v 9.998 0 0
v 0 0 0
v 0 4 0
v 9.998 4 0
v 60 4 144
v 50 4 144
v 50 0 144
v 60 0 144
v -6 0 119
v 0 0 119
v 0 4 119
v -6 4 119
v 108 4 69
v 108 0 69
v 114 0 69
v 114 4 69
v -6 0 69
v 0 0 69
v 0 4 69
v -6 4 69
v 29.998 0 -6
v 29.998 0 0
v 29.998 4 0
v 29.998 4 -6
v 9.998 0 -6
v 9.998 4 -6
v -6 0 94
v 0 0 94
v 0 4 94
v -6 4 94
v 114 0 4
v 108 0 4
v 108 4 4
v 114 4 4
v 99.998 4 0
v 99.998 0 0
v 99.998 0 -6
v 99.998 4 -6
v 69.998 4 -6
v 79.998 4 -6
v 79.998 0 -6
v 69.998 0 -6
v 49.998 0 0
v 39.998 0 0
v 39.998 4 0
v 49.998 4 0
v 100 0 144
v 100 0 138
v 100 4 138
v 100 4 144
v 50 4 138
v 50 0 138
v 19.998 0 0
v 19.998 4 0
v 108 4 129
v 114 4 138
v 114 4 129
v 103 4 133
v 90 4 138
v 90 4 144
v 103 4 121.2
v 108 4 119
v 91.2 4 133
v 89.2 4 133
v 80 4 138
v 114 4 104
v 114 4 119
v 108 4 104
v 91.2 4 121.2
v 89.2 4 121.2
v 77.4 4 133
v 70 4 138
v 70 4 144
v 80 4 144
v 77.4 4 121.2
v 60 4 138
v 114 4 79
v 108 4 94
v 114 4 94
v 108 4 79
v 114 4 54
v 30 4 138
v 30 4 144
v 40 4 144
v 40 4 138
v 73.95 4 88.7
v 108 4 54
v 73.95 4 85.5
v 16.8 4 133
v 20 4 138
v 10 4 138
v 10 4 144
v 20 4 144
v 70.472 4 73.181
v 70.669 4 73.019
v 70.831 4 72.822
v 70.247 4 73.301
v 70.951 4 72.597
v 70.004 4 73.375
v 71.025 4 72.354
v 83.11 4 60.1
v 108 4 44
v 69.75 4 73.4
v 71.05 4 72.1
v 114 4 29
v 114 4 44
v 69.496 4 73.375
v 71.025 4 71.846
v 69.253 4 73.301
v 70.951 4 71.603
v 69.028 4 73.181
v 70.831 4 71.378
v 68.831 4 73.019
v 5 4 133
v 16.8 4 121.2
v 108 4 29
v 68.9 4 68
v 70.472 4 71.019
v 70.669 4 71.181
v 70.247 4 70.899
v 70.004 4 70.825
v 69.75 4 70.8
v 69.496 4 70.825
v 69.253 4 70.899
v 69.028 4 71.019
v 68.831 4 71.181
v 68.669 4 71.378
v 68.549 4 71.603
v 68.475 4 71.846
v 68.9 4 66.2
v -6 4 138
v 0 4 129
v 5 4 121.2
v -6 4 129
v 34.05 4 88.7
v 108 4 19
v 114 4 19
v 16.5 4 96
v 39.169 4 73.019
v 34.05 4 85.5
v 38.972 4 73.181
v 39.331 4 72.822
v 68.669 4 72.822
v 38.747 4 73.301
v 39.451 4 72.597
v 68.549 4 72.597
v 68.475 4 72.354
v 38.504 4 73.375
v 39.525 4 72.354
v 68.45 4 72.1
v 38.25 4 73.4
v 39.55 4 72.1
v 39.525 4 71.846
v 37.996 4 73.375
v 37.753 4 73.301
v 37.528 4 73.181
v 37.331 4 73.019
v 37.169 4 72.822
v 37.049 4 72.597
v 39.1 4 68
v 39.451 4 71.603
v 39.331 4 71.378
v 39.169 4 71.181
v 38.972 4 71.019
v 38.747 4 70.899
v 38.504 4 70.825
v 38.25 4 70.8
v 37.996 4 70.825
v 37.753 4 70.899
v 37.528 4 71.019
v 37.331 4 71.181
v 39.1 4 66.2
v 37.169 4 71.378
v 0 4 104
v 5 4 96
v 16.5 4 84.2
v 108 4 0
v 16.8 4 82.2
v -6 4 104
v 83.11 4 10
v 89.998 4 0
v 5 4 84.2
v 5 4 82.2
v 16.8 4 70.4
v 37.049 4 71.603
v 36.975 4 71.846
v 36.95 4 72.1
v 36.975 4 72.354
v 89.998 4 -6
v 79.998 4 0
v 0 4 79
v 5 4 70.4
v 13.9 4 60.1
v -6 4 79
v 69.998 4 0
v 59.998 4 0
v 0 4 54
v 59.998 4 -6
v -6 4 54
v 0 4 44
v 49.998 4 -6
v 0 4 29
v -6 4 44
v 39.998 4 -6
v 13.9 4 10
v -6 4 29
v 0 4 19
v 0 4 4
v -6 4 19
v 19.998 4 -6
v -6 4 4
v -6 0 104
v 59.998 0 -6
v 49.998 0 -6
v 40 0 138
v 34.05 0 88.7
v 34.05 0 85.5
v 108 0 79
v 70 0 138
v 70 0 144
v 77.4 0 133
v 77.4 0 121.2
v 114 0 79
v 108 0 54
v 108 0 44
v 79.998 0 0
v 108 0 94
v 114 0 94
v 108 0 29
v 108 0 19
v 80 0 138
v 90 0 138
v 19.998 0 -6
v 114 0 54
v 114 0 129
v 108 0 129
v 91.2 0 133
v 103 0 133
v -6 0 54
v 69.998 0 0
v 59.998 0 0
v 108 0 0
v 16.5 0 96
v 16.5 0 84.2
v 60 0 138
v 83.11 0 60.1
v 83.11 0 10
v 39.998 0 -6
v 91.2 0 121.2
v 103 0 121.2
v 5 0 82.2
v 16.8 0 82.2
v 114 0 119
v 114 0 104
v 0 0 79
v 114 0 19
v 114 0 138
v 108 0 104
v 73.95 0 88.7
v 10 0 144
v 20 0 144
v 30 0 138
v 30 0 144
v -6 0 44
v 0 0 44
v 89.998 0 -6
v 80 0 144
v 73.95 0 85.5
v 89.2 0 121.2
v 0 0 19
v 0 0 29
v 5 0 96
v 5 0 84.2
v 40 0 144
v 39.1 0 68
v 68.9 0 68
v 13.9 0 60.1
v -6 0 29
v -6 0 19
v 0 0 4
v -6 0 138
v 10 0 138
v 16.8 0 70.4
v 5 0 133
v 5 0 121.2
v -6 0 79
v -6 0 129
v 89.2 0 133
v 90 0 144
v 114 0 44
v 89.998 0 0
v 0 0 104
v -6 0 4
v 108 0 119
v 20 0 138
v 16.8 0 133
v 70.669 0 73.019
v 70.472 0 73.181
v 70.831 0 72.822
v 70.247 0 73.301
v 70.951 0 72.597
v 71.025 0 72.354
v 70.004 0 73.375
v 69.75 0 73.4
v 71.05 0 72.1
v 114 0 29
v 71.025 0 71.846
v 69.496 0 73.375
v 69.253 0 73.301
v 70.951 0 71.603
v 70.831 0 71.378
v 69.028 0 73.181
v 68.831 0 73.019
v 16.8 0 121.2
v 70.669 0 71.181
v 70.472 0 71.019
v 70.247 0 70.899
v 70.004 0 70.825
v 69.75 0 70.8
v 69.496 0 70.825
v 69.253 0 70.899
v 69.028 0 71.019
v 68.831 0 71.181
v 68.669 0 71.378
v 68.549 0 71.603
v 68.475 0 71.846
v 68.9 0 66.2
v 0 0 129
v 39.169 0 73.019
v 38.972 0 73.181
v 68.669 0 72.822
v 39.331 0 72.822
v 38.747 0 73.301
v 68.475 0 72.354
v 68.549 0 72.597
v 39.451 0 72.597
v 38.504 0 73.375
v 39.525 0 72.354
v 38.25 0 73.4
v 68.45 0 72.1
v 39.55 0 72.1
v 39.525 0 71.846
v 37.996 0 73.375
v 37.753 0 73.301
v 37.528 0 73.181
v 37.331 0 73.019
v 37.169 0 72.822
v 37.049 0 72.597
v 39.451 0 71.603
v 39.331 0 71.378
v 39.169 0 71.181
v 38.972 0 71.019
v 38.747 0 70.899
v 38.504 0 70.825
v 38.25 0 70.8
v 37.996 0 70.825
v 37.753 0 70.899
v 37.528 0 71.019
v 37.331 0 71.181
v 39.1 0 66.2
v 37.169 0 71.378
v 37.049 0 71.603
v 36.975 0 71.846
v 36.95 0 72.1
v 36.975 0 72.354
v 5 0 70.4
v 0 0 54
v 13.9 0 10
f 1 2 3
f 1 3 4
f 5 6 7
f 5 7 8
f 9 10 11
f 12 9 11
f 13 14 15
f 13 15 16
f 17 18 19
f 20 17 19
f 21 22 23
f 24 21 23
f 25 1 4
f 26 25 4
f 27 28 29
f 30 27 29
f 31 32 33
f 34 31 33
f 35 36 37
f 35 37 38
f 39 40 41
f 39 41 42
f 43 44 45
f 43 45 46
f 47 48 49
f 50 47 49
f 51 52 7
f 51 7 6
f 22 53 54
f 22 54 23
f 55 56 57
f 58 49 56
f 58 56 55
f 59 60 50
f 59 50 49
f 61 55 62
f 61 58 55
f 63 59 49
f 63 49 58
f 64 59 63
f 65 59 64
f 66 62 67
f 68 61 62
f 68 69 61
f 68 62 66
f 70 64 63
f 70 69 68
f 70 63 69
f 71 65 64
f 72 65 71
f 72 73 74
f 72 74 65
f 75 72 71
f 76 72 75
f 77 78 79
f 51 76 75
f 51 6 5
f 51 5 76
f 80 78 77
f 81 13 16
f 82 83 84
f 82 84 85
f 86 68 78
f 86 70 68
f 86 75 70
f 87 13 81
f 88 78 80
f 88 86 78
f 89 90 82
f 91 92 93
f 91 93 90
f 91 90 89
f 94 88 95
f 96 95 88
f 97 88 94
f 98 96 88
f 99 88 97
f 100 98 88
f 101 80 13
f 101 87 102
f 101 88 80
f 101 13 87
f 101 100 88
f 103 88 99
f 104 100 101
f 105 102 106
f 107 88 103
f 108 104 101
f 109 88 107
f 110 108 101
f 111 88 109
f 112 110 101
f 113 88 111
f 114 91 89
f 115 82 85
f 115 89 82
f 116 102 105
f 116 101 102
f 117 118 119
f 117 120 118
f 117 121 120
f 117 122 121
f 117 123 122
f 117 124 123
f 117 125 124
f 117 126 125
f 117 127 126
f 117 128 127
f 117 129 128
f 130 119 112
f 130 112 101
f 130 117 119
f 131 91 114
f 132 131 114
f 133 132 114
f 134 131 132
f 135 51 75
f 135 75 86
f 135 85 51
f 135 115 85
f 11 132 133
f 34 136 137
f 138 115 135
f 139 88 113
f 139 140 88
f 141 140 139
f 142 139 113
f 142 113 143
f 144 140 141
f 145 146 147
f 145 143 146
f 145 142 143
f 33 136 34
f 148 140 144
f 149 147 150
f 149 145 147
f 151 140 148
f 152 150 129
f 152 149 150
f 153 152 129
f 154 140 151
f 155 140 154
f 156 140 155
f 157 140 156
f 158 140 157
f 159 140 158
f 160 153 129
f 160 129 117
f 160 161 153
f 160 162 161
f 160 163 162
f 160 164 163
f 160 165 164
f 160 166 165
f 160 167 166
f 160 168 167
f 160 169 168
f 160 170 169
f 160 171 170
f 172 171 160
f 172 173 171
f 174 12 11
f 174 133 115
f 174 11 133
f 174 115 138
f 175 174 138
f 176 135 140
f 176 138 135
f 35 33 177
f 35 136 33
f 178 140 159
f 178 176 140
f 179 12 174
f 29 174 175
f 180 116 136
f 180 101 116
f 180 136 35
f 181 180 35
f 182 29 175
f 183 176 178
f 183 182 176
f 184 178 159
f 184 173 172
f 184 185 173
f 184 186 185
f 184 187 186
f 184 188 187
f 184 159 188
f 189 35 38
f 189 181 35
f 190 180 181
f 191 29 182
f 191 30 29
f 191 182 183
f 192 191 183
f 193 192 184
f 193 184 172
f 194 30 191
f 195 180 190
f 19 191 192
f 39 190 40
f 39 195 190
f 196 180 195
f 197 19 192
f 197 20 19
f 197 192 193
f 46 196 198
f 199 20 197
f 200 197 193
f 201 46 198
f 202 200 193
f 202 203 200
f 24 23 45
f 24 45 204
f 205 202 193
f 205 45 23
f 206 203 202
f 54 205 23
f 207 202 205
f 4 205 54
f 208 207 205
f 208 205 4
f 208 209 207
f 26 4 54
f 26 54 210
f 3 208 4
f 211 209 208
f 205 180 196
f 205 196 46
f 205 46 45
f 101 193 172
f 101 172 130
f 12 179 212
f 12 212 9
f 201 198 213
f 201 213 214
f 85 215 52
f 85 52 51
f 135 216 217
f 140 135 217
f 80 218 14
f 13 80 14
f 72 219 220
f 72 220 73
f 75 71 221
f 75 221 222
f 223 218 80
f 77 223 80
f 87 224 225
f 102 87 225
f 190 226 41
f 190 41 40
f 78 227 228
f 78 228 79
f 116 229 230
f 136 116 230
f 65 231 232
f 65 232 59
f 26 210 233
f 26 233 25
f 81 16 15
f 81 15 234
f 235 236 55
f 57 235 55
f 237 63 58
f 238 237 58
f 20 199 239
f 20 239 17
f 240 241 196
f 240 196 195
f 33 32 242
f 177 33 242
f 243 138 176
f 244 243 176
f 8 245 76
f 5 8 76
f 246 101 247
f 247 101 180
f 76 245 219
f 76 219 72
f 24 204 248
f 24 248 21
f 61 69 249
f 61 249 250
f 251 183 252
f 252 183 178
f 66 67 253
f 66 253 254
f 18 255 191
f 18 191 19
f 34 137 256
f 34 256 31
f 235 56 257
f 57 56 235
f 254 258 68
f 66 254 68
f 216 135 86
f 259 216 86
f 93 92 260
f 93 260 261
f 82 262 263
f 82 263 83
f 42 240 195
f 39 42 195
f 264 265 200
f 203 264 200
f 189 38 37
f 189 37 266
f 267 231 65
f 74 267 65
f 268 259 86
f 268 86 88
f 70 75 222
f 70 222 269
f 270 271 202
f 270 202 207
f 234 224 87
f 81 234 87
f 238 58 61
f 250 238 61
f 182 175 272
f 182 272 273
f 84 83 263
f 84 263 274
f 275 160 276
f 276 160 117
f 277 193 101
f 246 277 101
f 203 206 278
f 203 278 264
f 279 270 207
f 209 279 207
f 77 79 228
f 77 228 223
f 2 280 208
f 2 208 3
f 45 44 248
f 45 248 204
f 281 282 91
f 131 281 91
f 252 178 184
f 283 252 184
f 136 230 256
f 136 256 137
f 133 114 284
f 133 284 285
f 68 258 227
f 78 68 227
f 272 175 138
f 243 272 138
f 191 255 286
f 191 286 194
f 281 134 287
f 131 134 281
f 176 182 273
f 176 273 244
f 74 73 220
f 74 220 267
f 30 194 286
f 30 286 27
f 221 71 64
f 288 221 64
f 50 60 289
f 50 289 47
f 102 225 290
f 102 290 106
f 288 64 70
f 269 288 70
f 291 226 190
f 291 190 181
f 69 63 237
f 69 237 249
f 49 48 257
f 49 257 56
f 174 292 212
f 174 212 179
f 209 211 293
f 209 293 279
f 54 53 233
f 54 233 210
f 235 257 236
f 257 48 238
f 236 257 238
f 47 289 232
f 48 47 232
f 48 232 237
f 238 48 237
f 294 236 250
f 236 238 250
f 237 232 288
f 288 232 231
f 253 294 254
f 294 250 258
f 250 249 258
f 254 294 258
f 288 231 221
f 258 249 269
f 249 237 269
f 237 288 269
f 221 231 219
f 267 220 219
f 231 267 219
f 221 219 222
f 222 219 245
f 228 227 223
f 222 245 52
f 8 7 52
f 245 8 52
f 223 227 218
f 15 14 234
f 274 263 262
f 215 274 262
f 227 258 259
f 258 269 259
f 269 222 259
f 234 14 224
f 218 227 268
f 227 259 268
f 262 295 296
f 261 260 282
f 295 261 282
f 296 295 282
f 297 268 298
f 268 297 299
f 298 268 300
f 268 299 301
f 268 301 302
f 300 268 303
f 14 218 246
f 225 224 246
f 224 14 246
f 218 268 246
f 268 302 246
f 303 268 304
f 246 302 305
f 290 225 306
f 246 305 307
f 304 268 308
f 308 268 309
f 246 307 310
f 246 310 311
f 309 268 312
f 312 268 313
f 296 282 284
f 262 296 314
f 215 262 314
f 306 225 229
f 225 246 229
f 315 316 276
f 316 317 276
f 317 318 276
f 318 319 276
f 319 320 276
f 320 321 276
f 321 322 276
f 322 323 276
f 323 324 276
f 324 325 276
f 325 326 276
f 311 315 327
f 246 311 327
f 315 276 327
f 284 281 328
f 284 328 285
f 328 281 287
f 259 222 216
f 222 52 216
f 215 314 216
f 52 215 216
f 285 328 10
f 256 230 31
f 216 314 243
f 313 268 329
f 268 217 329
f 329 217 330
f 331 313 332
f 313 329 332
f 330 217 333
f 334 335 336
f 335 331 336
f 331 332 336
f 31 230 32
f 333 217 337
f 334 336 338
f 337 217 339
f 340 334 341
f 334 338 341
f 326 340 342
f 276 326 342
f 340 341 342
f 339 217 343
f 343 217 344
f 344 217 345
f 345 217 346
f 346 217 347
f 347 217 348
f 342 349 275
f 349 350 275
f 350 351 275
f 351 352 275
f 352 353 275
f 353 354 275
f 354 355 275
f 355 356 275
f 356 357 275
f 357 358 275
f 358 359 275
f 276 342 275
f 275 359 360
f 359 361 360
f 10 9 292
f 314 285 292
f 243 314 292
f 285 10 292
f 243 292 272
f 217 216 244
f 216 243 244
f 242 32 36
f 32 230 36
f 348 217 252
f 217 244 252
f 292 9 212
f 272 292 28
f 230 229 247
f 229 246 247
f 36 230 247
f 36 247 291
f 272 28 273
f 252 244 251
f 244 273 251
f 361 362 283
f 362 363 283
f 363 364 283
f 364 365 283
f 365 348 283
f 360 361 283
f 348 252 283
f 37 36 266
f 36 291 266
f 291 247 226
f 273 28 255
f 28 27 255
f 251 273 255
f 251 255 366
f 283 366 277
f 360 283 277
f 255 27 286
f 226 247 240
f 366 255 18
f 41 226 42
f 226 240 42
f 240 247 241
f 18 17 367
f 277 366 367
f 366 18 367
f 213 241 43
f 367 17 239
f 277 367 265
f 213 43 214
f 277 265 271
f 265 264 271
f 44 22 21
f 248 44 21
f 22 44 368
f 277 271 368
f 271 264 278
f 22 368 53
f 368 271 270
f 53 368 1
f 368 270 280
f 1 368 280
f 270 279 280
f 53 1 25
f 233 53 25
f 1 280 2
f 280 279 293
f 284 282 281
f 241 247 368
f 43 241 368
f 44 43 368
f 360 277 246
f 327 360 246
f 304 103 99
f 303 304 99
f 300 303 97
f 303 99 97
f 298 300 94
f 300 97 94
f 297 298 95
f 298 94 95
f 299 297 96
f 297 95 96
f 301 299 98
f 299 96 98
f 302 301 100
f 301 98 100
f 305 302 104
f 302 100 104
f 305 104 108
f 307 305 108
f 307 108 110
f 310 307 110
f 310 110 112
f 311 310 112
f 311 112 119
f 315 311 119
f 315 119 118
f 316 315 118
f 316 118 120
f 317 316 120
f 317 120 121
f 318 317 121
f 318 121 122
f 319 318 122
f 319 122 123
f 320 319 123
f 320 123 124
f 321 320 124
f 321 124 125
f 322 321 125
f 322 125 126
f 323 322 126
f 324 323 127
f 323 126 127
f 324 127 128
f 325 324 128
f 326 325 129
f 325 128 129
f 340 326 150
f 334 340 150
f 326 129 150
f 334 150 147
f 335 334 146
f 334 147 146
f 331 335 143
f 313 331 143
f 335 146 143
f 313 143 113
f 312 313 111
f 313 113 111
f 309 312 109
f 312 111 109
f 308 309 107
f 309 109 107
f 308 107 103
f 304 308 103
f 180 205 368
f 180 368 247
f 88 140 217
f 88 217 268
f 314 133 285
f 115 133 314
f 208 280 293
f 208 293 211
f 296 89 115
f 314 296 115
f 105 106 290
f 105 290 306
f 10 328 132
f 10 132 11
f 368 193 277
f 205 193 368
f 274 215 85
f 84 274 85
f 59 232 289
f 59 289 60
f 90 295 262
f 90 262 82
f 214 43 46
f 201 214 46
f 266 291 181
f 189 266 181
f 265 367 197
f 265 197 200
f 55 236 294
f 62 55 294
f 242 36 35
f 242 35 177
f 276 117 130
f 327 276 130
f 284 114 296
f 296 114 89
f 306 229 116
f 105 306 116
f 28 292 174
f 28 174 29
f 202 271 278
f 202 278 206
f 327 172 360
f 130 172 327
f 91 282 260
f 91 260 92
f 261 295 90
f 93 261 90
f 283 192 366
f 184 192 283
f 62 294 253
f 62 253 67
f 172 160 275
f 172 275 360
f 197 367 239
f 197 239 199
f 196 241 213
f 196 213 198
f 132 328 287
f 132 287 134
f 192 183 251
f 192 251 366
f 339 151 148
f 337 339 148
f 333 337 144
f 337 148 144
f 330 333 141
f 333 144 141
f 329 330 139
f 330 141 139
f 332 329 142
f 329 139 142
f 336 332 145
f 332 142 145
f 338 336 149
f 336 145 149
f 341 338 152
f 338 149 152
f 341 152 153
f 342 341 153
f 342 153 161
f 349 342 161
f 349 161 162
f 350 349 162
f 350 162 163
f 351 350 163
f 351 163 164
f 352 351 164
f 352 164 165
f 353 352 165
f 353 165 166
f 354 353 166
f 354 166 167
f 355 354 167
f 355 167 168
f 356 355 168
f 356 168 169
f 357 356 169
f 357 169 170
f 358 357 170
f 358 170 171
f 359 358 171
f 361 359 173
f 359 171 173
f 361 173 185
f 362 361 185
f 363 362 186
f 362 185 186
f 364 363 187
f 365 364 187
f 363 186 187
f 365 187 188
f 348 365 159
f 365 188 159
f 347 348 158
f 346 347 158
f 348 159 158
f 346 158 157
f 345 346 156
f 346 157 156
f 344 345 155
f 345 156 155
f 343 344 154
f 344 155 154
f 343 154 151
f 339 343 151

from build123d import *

# Parameters (mm, degrees)
SKETCH_1_W          = 108
SKETCH_1_H          = 138
EXTRUDE_1_DEPTH     = 4
SKETCH_2_W          = 69.21
SKETCH_2_H          = 50.1
CUT_EXTRUDE_1_DEPTH = 176.282628917
SKETCH_4_W          = 15
SKETCH_4_H          = 4
EXTRUDE_2_DEPTH     = 6
SKETCH_6_W          = 9
SKETCH_6_H          = 4
EXTRUDE_3_DEPTH     = 6
SKETCH_7_W          = 15
SKETCH_7_H          = 4
EXTRUDE_4_DEPTH     = 6
SKETCH_8_W          = 9
SKETCH_8_H          = 4
EXTRUDE_5_DEPTH     = 6
SKETCH_9_W          = 10
SKETCH_9_H          = 4
EXTRUDE_6_DEPTH     = 6
SKETCH_10_W         = 10
SKETCH_10_H         = 4
EXTRUDE_7_DEPTH     = 6
SKETCH_11_W         = 11.5
SKETCH_11_H         = 11.8
SKETCH_11_W_2       = 11.8
CUT_EXTRUDE_2_DEPTH = 184.706287318
SKETCH_12_W         = 11.8
SKETCH_12_H         = 11.8
CUT_EXTRUDE_3_DEPTH = 184.706287318
SKETCH_13_W         = 11.8
SKETCH_13_H         = 11.8
CUT_EXTRUDE_4_DEPTH = 184.706287318
SKETCH_14_R         = 1.3
SKETCH_14_W         = 29.8
SKETCH_14_H         = 1.8
SKETCH_14_W_2       = 39.9
SKETCH_14_H_2       = 3.2
CUT_EXTRUDE_5_DEPTH = 184.706287318


with BuildPart() as part:
    # Эскиз1 → Бобышка-Вытянуть1 (new body)
    with BuildSketch(Plane(origin=(0, 0, 0), x_dir=(1, 0, 0), z_dir=(0, 1, 0))):
        with Locations((54, -69)):
            Rectangle(SKETCH_1_W, SKETCH_1_H)
    extrude(amount=EXTRUDE_1_DEPTH)

    # Эскиз2 → Вырез-Вытянуть1 (cut, through all)
    with BuildSketch(Plane(origin=(0, 4, 0), x_dir=(1, 0, 0), z_dir=(0, 1, 0))):
        with Locations((48.505, -35.05)):
            Rectangle(SKETCH_2_W, SKETCH_2_H)
    extrude(amount=-CUT_EXTRUDE_1_DEPTH, mode=Mode.SUBTRACT)

    # Эскиз4 → Бобышка-Вытянуть2 (add)
    with BuildSketch(Plane.ZY):
        with Locations((11.5, 2)):
            Rectangle(SKETCH_4_W, SKETCH_4_H)
        with Locations((36.5, 2)):
            Rectangle(SKETCH_4_W, SKETCH_4_H)
        with Locations((61.5, 2)):
            Rectangle(SKETCH_4_W, SKETCH_4_H)
        with Locations((86.5, 2)):
            Rectangle(SKETCH_4_W, SKETCH_4_H)
        with Locations((111.5, 2)):
            Rectangle(SKETCH_4_W, SKETCH_4_H)
    extrude(amount=EXTRUDE_2_DEPTH)

    # Эскиз6 → Бобышка-Вытянуть3 (add)
    with BuildSketch(Plane.ZY):
        with Locations((133.5, 2)):
            Rectangle(SKETCH_6_W, SKETCH_6_H)
    extrude(amount=EXTRUDE_3_DEPTH)

    # Эскиз7 → Бобышка-Вытянуть4 (add)
    with BuildSketch(Plane(origin=(108, 0, 0), x_dir=(0, 0, -1), z_dir=(1, 0, 0))):
        with Locations((-11.5, 2)):
            Rectangle(SKETCH_7_W, SKETCH_7_H)
        with Locations((-36.5, 2)):
            Rectangle(SKETCH_7_W, SKETCH_7_H)
        with Locations((-61.5, 2)):
            Rectangle(SKETCH_7_W, SKETCH_7_H)
        with Locations((-86.5, 2)):
            Rectangle(SKETCH_7_W, SKETCH_7_H)
        with Locations((-111.5, 2)):
            Rectangle(SKETCH_7_W, SKETCH_7_H)
    extrude(amount=EXTRUDE_4_DEPTH)

    # Эскиз8 → Бобышка-Вытянуть5 (add)
    with BuildSketch(Plane(origin=(108, 0, 0), x_dir=(0, 0, -1), z_dir=(1, 0, 0))):
        with Locations((-133.5, 2)):
            Rectangle(SKETCH_8_W, SKETCH_8_H)
    extrude(amount=EXTRUDE_5_DEPTH)

    # Эскиз9 → Бобышка-Вытянуть6 (add)
    with BuildSketch(Plane(origin=(0, 0, 0), x_dir=(-1, 0, 0), z_dir=(0, 0, -1))):
        with Locations((-94.998495411, 2)):
            Rectangle(SKETCH_9_W, SKETCH_9_H)
        with Locations((-74.998495411, 2)):
            Rectangle(SKETCH_9_W, SKETCH_9_H)
        with Locations((-54.998495411, 2)):
            Rectangle(SKETCH_9_W, SKETCH_9_H)
        with Locations((-34.998495411, 2)):
            Rectangle(SKETCH_9_W, SKETCH_9_H)
        with Locations((-14.998495411, 2)):
            Rectangle(SKETCH_9_W, SKETCH_9_H)
    extrude(amount=EXTRUDE_6_DEPTH)

    # Эскиз10 → Бобышка-Вытянуть7 (add)
    with BuildSketch(Plane.XY.offset(138)):
        with Locations((15, 2)):
            Rectangle(SKETCH_10_W, SKETCH_10_H)
        with Locations((35, 2)):
            Rectangle(SKETCH_10_W, SKETCH_10_H)
        with Locations((55, 2)):
            Rectangle(SKETCH_10_W, SKETCH_10_H)
        with Locations((75, 2)):
            Rectangle(SKETCH_10_W, SKETCH_10_H)
        with Locations((95, 2)):
            Rectangle(SKETCH_10_W, SKETCH_10_H)
    extrude(amount=EXTRUDE_7_DEPTH)

    # Эскиз11 → Вырез-Вытянуть2 (cut, through all)
    with BuildSketch(Plane(origin=(0, 4, 0), x_dir=(1, 0, 0), z_dir=(0, 1, 0))):
        with Locations((10.75, -90.1)):
            Rectangle(SKETCH_11_W, SKETCH_11_H)
        with Locations((10.9, -76.3)):
            Rectangle(SKETCH_11_W_2, SKETCH_11_H)
    extrude(amount=-CUT_EXTRUDE_2_DEPTH, mode=Mode.SUBTRACT)

    # Эскиз12 → Вырез-Вытянуть3 (cut, through all)
    with BuildSketch(Plane(origin=(0, 4, 0), x_dir=(1, 0, 0), z_dir=(0, 1, 0))):
        with Locations((83.3, -127.1)):
            Rectangle(SKETCH_12_W, SKETCH_12_H)
        with Locations((97.1, -127.1)):
            Rectangle(SKETCH_12_W, SKETCH_12_H)
    extrude(amount=-CUT_EXTRUDE_3_DEPTH, mode=Mode.SUBTRACT)

    # Эскиз13 → Вырез-Вытянуть4 (cut, through all)
    with BuildSketch(Plane(origin=(0, 4, 0), x_dir=(1, 0, 0), z_dir=(0, 1, 0))):
        with Locations((10.9, -127.1)):
            Rectangle(SKETCH_13_W, SKETCH_13_H)
    extrude(amount=-CUT_EXTRUDE_4_DEPTH, mode=Mode.SUBTRACT)

    # Эскиз14 → Вырез-Вытянуть5 (cut, through all)
    with BuildSketch(Plane(origin=(0, 4, 0), x_dir=(1, 0, 0), z_dir=(0, 1, 0))):
        with Locations(Location((38.25, -72.1, 0), (0, 0, 270))):
            Circle(SKETCH_14_R)
        with Locations(Location((69.75, -72.1, 0), (0, 0, 270))):
            Circle(SKETCH_14_R)
        with Locations((54, -67.1)):
            Rectangle(SKETCH_14_W, SKETCH_14_H)
        with Locations((54, -87.1)):
            Rectangle(SKETCH_14_W_2, SKETCH_14_H_2)
    extrude(amount=-CUT_EXTRUDE_5_DEPTH, mode=Mode.SUBTRACT)


solid = part.part
